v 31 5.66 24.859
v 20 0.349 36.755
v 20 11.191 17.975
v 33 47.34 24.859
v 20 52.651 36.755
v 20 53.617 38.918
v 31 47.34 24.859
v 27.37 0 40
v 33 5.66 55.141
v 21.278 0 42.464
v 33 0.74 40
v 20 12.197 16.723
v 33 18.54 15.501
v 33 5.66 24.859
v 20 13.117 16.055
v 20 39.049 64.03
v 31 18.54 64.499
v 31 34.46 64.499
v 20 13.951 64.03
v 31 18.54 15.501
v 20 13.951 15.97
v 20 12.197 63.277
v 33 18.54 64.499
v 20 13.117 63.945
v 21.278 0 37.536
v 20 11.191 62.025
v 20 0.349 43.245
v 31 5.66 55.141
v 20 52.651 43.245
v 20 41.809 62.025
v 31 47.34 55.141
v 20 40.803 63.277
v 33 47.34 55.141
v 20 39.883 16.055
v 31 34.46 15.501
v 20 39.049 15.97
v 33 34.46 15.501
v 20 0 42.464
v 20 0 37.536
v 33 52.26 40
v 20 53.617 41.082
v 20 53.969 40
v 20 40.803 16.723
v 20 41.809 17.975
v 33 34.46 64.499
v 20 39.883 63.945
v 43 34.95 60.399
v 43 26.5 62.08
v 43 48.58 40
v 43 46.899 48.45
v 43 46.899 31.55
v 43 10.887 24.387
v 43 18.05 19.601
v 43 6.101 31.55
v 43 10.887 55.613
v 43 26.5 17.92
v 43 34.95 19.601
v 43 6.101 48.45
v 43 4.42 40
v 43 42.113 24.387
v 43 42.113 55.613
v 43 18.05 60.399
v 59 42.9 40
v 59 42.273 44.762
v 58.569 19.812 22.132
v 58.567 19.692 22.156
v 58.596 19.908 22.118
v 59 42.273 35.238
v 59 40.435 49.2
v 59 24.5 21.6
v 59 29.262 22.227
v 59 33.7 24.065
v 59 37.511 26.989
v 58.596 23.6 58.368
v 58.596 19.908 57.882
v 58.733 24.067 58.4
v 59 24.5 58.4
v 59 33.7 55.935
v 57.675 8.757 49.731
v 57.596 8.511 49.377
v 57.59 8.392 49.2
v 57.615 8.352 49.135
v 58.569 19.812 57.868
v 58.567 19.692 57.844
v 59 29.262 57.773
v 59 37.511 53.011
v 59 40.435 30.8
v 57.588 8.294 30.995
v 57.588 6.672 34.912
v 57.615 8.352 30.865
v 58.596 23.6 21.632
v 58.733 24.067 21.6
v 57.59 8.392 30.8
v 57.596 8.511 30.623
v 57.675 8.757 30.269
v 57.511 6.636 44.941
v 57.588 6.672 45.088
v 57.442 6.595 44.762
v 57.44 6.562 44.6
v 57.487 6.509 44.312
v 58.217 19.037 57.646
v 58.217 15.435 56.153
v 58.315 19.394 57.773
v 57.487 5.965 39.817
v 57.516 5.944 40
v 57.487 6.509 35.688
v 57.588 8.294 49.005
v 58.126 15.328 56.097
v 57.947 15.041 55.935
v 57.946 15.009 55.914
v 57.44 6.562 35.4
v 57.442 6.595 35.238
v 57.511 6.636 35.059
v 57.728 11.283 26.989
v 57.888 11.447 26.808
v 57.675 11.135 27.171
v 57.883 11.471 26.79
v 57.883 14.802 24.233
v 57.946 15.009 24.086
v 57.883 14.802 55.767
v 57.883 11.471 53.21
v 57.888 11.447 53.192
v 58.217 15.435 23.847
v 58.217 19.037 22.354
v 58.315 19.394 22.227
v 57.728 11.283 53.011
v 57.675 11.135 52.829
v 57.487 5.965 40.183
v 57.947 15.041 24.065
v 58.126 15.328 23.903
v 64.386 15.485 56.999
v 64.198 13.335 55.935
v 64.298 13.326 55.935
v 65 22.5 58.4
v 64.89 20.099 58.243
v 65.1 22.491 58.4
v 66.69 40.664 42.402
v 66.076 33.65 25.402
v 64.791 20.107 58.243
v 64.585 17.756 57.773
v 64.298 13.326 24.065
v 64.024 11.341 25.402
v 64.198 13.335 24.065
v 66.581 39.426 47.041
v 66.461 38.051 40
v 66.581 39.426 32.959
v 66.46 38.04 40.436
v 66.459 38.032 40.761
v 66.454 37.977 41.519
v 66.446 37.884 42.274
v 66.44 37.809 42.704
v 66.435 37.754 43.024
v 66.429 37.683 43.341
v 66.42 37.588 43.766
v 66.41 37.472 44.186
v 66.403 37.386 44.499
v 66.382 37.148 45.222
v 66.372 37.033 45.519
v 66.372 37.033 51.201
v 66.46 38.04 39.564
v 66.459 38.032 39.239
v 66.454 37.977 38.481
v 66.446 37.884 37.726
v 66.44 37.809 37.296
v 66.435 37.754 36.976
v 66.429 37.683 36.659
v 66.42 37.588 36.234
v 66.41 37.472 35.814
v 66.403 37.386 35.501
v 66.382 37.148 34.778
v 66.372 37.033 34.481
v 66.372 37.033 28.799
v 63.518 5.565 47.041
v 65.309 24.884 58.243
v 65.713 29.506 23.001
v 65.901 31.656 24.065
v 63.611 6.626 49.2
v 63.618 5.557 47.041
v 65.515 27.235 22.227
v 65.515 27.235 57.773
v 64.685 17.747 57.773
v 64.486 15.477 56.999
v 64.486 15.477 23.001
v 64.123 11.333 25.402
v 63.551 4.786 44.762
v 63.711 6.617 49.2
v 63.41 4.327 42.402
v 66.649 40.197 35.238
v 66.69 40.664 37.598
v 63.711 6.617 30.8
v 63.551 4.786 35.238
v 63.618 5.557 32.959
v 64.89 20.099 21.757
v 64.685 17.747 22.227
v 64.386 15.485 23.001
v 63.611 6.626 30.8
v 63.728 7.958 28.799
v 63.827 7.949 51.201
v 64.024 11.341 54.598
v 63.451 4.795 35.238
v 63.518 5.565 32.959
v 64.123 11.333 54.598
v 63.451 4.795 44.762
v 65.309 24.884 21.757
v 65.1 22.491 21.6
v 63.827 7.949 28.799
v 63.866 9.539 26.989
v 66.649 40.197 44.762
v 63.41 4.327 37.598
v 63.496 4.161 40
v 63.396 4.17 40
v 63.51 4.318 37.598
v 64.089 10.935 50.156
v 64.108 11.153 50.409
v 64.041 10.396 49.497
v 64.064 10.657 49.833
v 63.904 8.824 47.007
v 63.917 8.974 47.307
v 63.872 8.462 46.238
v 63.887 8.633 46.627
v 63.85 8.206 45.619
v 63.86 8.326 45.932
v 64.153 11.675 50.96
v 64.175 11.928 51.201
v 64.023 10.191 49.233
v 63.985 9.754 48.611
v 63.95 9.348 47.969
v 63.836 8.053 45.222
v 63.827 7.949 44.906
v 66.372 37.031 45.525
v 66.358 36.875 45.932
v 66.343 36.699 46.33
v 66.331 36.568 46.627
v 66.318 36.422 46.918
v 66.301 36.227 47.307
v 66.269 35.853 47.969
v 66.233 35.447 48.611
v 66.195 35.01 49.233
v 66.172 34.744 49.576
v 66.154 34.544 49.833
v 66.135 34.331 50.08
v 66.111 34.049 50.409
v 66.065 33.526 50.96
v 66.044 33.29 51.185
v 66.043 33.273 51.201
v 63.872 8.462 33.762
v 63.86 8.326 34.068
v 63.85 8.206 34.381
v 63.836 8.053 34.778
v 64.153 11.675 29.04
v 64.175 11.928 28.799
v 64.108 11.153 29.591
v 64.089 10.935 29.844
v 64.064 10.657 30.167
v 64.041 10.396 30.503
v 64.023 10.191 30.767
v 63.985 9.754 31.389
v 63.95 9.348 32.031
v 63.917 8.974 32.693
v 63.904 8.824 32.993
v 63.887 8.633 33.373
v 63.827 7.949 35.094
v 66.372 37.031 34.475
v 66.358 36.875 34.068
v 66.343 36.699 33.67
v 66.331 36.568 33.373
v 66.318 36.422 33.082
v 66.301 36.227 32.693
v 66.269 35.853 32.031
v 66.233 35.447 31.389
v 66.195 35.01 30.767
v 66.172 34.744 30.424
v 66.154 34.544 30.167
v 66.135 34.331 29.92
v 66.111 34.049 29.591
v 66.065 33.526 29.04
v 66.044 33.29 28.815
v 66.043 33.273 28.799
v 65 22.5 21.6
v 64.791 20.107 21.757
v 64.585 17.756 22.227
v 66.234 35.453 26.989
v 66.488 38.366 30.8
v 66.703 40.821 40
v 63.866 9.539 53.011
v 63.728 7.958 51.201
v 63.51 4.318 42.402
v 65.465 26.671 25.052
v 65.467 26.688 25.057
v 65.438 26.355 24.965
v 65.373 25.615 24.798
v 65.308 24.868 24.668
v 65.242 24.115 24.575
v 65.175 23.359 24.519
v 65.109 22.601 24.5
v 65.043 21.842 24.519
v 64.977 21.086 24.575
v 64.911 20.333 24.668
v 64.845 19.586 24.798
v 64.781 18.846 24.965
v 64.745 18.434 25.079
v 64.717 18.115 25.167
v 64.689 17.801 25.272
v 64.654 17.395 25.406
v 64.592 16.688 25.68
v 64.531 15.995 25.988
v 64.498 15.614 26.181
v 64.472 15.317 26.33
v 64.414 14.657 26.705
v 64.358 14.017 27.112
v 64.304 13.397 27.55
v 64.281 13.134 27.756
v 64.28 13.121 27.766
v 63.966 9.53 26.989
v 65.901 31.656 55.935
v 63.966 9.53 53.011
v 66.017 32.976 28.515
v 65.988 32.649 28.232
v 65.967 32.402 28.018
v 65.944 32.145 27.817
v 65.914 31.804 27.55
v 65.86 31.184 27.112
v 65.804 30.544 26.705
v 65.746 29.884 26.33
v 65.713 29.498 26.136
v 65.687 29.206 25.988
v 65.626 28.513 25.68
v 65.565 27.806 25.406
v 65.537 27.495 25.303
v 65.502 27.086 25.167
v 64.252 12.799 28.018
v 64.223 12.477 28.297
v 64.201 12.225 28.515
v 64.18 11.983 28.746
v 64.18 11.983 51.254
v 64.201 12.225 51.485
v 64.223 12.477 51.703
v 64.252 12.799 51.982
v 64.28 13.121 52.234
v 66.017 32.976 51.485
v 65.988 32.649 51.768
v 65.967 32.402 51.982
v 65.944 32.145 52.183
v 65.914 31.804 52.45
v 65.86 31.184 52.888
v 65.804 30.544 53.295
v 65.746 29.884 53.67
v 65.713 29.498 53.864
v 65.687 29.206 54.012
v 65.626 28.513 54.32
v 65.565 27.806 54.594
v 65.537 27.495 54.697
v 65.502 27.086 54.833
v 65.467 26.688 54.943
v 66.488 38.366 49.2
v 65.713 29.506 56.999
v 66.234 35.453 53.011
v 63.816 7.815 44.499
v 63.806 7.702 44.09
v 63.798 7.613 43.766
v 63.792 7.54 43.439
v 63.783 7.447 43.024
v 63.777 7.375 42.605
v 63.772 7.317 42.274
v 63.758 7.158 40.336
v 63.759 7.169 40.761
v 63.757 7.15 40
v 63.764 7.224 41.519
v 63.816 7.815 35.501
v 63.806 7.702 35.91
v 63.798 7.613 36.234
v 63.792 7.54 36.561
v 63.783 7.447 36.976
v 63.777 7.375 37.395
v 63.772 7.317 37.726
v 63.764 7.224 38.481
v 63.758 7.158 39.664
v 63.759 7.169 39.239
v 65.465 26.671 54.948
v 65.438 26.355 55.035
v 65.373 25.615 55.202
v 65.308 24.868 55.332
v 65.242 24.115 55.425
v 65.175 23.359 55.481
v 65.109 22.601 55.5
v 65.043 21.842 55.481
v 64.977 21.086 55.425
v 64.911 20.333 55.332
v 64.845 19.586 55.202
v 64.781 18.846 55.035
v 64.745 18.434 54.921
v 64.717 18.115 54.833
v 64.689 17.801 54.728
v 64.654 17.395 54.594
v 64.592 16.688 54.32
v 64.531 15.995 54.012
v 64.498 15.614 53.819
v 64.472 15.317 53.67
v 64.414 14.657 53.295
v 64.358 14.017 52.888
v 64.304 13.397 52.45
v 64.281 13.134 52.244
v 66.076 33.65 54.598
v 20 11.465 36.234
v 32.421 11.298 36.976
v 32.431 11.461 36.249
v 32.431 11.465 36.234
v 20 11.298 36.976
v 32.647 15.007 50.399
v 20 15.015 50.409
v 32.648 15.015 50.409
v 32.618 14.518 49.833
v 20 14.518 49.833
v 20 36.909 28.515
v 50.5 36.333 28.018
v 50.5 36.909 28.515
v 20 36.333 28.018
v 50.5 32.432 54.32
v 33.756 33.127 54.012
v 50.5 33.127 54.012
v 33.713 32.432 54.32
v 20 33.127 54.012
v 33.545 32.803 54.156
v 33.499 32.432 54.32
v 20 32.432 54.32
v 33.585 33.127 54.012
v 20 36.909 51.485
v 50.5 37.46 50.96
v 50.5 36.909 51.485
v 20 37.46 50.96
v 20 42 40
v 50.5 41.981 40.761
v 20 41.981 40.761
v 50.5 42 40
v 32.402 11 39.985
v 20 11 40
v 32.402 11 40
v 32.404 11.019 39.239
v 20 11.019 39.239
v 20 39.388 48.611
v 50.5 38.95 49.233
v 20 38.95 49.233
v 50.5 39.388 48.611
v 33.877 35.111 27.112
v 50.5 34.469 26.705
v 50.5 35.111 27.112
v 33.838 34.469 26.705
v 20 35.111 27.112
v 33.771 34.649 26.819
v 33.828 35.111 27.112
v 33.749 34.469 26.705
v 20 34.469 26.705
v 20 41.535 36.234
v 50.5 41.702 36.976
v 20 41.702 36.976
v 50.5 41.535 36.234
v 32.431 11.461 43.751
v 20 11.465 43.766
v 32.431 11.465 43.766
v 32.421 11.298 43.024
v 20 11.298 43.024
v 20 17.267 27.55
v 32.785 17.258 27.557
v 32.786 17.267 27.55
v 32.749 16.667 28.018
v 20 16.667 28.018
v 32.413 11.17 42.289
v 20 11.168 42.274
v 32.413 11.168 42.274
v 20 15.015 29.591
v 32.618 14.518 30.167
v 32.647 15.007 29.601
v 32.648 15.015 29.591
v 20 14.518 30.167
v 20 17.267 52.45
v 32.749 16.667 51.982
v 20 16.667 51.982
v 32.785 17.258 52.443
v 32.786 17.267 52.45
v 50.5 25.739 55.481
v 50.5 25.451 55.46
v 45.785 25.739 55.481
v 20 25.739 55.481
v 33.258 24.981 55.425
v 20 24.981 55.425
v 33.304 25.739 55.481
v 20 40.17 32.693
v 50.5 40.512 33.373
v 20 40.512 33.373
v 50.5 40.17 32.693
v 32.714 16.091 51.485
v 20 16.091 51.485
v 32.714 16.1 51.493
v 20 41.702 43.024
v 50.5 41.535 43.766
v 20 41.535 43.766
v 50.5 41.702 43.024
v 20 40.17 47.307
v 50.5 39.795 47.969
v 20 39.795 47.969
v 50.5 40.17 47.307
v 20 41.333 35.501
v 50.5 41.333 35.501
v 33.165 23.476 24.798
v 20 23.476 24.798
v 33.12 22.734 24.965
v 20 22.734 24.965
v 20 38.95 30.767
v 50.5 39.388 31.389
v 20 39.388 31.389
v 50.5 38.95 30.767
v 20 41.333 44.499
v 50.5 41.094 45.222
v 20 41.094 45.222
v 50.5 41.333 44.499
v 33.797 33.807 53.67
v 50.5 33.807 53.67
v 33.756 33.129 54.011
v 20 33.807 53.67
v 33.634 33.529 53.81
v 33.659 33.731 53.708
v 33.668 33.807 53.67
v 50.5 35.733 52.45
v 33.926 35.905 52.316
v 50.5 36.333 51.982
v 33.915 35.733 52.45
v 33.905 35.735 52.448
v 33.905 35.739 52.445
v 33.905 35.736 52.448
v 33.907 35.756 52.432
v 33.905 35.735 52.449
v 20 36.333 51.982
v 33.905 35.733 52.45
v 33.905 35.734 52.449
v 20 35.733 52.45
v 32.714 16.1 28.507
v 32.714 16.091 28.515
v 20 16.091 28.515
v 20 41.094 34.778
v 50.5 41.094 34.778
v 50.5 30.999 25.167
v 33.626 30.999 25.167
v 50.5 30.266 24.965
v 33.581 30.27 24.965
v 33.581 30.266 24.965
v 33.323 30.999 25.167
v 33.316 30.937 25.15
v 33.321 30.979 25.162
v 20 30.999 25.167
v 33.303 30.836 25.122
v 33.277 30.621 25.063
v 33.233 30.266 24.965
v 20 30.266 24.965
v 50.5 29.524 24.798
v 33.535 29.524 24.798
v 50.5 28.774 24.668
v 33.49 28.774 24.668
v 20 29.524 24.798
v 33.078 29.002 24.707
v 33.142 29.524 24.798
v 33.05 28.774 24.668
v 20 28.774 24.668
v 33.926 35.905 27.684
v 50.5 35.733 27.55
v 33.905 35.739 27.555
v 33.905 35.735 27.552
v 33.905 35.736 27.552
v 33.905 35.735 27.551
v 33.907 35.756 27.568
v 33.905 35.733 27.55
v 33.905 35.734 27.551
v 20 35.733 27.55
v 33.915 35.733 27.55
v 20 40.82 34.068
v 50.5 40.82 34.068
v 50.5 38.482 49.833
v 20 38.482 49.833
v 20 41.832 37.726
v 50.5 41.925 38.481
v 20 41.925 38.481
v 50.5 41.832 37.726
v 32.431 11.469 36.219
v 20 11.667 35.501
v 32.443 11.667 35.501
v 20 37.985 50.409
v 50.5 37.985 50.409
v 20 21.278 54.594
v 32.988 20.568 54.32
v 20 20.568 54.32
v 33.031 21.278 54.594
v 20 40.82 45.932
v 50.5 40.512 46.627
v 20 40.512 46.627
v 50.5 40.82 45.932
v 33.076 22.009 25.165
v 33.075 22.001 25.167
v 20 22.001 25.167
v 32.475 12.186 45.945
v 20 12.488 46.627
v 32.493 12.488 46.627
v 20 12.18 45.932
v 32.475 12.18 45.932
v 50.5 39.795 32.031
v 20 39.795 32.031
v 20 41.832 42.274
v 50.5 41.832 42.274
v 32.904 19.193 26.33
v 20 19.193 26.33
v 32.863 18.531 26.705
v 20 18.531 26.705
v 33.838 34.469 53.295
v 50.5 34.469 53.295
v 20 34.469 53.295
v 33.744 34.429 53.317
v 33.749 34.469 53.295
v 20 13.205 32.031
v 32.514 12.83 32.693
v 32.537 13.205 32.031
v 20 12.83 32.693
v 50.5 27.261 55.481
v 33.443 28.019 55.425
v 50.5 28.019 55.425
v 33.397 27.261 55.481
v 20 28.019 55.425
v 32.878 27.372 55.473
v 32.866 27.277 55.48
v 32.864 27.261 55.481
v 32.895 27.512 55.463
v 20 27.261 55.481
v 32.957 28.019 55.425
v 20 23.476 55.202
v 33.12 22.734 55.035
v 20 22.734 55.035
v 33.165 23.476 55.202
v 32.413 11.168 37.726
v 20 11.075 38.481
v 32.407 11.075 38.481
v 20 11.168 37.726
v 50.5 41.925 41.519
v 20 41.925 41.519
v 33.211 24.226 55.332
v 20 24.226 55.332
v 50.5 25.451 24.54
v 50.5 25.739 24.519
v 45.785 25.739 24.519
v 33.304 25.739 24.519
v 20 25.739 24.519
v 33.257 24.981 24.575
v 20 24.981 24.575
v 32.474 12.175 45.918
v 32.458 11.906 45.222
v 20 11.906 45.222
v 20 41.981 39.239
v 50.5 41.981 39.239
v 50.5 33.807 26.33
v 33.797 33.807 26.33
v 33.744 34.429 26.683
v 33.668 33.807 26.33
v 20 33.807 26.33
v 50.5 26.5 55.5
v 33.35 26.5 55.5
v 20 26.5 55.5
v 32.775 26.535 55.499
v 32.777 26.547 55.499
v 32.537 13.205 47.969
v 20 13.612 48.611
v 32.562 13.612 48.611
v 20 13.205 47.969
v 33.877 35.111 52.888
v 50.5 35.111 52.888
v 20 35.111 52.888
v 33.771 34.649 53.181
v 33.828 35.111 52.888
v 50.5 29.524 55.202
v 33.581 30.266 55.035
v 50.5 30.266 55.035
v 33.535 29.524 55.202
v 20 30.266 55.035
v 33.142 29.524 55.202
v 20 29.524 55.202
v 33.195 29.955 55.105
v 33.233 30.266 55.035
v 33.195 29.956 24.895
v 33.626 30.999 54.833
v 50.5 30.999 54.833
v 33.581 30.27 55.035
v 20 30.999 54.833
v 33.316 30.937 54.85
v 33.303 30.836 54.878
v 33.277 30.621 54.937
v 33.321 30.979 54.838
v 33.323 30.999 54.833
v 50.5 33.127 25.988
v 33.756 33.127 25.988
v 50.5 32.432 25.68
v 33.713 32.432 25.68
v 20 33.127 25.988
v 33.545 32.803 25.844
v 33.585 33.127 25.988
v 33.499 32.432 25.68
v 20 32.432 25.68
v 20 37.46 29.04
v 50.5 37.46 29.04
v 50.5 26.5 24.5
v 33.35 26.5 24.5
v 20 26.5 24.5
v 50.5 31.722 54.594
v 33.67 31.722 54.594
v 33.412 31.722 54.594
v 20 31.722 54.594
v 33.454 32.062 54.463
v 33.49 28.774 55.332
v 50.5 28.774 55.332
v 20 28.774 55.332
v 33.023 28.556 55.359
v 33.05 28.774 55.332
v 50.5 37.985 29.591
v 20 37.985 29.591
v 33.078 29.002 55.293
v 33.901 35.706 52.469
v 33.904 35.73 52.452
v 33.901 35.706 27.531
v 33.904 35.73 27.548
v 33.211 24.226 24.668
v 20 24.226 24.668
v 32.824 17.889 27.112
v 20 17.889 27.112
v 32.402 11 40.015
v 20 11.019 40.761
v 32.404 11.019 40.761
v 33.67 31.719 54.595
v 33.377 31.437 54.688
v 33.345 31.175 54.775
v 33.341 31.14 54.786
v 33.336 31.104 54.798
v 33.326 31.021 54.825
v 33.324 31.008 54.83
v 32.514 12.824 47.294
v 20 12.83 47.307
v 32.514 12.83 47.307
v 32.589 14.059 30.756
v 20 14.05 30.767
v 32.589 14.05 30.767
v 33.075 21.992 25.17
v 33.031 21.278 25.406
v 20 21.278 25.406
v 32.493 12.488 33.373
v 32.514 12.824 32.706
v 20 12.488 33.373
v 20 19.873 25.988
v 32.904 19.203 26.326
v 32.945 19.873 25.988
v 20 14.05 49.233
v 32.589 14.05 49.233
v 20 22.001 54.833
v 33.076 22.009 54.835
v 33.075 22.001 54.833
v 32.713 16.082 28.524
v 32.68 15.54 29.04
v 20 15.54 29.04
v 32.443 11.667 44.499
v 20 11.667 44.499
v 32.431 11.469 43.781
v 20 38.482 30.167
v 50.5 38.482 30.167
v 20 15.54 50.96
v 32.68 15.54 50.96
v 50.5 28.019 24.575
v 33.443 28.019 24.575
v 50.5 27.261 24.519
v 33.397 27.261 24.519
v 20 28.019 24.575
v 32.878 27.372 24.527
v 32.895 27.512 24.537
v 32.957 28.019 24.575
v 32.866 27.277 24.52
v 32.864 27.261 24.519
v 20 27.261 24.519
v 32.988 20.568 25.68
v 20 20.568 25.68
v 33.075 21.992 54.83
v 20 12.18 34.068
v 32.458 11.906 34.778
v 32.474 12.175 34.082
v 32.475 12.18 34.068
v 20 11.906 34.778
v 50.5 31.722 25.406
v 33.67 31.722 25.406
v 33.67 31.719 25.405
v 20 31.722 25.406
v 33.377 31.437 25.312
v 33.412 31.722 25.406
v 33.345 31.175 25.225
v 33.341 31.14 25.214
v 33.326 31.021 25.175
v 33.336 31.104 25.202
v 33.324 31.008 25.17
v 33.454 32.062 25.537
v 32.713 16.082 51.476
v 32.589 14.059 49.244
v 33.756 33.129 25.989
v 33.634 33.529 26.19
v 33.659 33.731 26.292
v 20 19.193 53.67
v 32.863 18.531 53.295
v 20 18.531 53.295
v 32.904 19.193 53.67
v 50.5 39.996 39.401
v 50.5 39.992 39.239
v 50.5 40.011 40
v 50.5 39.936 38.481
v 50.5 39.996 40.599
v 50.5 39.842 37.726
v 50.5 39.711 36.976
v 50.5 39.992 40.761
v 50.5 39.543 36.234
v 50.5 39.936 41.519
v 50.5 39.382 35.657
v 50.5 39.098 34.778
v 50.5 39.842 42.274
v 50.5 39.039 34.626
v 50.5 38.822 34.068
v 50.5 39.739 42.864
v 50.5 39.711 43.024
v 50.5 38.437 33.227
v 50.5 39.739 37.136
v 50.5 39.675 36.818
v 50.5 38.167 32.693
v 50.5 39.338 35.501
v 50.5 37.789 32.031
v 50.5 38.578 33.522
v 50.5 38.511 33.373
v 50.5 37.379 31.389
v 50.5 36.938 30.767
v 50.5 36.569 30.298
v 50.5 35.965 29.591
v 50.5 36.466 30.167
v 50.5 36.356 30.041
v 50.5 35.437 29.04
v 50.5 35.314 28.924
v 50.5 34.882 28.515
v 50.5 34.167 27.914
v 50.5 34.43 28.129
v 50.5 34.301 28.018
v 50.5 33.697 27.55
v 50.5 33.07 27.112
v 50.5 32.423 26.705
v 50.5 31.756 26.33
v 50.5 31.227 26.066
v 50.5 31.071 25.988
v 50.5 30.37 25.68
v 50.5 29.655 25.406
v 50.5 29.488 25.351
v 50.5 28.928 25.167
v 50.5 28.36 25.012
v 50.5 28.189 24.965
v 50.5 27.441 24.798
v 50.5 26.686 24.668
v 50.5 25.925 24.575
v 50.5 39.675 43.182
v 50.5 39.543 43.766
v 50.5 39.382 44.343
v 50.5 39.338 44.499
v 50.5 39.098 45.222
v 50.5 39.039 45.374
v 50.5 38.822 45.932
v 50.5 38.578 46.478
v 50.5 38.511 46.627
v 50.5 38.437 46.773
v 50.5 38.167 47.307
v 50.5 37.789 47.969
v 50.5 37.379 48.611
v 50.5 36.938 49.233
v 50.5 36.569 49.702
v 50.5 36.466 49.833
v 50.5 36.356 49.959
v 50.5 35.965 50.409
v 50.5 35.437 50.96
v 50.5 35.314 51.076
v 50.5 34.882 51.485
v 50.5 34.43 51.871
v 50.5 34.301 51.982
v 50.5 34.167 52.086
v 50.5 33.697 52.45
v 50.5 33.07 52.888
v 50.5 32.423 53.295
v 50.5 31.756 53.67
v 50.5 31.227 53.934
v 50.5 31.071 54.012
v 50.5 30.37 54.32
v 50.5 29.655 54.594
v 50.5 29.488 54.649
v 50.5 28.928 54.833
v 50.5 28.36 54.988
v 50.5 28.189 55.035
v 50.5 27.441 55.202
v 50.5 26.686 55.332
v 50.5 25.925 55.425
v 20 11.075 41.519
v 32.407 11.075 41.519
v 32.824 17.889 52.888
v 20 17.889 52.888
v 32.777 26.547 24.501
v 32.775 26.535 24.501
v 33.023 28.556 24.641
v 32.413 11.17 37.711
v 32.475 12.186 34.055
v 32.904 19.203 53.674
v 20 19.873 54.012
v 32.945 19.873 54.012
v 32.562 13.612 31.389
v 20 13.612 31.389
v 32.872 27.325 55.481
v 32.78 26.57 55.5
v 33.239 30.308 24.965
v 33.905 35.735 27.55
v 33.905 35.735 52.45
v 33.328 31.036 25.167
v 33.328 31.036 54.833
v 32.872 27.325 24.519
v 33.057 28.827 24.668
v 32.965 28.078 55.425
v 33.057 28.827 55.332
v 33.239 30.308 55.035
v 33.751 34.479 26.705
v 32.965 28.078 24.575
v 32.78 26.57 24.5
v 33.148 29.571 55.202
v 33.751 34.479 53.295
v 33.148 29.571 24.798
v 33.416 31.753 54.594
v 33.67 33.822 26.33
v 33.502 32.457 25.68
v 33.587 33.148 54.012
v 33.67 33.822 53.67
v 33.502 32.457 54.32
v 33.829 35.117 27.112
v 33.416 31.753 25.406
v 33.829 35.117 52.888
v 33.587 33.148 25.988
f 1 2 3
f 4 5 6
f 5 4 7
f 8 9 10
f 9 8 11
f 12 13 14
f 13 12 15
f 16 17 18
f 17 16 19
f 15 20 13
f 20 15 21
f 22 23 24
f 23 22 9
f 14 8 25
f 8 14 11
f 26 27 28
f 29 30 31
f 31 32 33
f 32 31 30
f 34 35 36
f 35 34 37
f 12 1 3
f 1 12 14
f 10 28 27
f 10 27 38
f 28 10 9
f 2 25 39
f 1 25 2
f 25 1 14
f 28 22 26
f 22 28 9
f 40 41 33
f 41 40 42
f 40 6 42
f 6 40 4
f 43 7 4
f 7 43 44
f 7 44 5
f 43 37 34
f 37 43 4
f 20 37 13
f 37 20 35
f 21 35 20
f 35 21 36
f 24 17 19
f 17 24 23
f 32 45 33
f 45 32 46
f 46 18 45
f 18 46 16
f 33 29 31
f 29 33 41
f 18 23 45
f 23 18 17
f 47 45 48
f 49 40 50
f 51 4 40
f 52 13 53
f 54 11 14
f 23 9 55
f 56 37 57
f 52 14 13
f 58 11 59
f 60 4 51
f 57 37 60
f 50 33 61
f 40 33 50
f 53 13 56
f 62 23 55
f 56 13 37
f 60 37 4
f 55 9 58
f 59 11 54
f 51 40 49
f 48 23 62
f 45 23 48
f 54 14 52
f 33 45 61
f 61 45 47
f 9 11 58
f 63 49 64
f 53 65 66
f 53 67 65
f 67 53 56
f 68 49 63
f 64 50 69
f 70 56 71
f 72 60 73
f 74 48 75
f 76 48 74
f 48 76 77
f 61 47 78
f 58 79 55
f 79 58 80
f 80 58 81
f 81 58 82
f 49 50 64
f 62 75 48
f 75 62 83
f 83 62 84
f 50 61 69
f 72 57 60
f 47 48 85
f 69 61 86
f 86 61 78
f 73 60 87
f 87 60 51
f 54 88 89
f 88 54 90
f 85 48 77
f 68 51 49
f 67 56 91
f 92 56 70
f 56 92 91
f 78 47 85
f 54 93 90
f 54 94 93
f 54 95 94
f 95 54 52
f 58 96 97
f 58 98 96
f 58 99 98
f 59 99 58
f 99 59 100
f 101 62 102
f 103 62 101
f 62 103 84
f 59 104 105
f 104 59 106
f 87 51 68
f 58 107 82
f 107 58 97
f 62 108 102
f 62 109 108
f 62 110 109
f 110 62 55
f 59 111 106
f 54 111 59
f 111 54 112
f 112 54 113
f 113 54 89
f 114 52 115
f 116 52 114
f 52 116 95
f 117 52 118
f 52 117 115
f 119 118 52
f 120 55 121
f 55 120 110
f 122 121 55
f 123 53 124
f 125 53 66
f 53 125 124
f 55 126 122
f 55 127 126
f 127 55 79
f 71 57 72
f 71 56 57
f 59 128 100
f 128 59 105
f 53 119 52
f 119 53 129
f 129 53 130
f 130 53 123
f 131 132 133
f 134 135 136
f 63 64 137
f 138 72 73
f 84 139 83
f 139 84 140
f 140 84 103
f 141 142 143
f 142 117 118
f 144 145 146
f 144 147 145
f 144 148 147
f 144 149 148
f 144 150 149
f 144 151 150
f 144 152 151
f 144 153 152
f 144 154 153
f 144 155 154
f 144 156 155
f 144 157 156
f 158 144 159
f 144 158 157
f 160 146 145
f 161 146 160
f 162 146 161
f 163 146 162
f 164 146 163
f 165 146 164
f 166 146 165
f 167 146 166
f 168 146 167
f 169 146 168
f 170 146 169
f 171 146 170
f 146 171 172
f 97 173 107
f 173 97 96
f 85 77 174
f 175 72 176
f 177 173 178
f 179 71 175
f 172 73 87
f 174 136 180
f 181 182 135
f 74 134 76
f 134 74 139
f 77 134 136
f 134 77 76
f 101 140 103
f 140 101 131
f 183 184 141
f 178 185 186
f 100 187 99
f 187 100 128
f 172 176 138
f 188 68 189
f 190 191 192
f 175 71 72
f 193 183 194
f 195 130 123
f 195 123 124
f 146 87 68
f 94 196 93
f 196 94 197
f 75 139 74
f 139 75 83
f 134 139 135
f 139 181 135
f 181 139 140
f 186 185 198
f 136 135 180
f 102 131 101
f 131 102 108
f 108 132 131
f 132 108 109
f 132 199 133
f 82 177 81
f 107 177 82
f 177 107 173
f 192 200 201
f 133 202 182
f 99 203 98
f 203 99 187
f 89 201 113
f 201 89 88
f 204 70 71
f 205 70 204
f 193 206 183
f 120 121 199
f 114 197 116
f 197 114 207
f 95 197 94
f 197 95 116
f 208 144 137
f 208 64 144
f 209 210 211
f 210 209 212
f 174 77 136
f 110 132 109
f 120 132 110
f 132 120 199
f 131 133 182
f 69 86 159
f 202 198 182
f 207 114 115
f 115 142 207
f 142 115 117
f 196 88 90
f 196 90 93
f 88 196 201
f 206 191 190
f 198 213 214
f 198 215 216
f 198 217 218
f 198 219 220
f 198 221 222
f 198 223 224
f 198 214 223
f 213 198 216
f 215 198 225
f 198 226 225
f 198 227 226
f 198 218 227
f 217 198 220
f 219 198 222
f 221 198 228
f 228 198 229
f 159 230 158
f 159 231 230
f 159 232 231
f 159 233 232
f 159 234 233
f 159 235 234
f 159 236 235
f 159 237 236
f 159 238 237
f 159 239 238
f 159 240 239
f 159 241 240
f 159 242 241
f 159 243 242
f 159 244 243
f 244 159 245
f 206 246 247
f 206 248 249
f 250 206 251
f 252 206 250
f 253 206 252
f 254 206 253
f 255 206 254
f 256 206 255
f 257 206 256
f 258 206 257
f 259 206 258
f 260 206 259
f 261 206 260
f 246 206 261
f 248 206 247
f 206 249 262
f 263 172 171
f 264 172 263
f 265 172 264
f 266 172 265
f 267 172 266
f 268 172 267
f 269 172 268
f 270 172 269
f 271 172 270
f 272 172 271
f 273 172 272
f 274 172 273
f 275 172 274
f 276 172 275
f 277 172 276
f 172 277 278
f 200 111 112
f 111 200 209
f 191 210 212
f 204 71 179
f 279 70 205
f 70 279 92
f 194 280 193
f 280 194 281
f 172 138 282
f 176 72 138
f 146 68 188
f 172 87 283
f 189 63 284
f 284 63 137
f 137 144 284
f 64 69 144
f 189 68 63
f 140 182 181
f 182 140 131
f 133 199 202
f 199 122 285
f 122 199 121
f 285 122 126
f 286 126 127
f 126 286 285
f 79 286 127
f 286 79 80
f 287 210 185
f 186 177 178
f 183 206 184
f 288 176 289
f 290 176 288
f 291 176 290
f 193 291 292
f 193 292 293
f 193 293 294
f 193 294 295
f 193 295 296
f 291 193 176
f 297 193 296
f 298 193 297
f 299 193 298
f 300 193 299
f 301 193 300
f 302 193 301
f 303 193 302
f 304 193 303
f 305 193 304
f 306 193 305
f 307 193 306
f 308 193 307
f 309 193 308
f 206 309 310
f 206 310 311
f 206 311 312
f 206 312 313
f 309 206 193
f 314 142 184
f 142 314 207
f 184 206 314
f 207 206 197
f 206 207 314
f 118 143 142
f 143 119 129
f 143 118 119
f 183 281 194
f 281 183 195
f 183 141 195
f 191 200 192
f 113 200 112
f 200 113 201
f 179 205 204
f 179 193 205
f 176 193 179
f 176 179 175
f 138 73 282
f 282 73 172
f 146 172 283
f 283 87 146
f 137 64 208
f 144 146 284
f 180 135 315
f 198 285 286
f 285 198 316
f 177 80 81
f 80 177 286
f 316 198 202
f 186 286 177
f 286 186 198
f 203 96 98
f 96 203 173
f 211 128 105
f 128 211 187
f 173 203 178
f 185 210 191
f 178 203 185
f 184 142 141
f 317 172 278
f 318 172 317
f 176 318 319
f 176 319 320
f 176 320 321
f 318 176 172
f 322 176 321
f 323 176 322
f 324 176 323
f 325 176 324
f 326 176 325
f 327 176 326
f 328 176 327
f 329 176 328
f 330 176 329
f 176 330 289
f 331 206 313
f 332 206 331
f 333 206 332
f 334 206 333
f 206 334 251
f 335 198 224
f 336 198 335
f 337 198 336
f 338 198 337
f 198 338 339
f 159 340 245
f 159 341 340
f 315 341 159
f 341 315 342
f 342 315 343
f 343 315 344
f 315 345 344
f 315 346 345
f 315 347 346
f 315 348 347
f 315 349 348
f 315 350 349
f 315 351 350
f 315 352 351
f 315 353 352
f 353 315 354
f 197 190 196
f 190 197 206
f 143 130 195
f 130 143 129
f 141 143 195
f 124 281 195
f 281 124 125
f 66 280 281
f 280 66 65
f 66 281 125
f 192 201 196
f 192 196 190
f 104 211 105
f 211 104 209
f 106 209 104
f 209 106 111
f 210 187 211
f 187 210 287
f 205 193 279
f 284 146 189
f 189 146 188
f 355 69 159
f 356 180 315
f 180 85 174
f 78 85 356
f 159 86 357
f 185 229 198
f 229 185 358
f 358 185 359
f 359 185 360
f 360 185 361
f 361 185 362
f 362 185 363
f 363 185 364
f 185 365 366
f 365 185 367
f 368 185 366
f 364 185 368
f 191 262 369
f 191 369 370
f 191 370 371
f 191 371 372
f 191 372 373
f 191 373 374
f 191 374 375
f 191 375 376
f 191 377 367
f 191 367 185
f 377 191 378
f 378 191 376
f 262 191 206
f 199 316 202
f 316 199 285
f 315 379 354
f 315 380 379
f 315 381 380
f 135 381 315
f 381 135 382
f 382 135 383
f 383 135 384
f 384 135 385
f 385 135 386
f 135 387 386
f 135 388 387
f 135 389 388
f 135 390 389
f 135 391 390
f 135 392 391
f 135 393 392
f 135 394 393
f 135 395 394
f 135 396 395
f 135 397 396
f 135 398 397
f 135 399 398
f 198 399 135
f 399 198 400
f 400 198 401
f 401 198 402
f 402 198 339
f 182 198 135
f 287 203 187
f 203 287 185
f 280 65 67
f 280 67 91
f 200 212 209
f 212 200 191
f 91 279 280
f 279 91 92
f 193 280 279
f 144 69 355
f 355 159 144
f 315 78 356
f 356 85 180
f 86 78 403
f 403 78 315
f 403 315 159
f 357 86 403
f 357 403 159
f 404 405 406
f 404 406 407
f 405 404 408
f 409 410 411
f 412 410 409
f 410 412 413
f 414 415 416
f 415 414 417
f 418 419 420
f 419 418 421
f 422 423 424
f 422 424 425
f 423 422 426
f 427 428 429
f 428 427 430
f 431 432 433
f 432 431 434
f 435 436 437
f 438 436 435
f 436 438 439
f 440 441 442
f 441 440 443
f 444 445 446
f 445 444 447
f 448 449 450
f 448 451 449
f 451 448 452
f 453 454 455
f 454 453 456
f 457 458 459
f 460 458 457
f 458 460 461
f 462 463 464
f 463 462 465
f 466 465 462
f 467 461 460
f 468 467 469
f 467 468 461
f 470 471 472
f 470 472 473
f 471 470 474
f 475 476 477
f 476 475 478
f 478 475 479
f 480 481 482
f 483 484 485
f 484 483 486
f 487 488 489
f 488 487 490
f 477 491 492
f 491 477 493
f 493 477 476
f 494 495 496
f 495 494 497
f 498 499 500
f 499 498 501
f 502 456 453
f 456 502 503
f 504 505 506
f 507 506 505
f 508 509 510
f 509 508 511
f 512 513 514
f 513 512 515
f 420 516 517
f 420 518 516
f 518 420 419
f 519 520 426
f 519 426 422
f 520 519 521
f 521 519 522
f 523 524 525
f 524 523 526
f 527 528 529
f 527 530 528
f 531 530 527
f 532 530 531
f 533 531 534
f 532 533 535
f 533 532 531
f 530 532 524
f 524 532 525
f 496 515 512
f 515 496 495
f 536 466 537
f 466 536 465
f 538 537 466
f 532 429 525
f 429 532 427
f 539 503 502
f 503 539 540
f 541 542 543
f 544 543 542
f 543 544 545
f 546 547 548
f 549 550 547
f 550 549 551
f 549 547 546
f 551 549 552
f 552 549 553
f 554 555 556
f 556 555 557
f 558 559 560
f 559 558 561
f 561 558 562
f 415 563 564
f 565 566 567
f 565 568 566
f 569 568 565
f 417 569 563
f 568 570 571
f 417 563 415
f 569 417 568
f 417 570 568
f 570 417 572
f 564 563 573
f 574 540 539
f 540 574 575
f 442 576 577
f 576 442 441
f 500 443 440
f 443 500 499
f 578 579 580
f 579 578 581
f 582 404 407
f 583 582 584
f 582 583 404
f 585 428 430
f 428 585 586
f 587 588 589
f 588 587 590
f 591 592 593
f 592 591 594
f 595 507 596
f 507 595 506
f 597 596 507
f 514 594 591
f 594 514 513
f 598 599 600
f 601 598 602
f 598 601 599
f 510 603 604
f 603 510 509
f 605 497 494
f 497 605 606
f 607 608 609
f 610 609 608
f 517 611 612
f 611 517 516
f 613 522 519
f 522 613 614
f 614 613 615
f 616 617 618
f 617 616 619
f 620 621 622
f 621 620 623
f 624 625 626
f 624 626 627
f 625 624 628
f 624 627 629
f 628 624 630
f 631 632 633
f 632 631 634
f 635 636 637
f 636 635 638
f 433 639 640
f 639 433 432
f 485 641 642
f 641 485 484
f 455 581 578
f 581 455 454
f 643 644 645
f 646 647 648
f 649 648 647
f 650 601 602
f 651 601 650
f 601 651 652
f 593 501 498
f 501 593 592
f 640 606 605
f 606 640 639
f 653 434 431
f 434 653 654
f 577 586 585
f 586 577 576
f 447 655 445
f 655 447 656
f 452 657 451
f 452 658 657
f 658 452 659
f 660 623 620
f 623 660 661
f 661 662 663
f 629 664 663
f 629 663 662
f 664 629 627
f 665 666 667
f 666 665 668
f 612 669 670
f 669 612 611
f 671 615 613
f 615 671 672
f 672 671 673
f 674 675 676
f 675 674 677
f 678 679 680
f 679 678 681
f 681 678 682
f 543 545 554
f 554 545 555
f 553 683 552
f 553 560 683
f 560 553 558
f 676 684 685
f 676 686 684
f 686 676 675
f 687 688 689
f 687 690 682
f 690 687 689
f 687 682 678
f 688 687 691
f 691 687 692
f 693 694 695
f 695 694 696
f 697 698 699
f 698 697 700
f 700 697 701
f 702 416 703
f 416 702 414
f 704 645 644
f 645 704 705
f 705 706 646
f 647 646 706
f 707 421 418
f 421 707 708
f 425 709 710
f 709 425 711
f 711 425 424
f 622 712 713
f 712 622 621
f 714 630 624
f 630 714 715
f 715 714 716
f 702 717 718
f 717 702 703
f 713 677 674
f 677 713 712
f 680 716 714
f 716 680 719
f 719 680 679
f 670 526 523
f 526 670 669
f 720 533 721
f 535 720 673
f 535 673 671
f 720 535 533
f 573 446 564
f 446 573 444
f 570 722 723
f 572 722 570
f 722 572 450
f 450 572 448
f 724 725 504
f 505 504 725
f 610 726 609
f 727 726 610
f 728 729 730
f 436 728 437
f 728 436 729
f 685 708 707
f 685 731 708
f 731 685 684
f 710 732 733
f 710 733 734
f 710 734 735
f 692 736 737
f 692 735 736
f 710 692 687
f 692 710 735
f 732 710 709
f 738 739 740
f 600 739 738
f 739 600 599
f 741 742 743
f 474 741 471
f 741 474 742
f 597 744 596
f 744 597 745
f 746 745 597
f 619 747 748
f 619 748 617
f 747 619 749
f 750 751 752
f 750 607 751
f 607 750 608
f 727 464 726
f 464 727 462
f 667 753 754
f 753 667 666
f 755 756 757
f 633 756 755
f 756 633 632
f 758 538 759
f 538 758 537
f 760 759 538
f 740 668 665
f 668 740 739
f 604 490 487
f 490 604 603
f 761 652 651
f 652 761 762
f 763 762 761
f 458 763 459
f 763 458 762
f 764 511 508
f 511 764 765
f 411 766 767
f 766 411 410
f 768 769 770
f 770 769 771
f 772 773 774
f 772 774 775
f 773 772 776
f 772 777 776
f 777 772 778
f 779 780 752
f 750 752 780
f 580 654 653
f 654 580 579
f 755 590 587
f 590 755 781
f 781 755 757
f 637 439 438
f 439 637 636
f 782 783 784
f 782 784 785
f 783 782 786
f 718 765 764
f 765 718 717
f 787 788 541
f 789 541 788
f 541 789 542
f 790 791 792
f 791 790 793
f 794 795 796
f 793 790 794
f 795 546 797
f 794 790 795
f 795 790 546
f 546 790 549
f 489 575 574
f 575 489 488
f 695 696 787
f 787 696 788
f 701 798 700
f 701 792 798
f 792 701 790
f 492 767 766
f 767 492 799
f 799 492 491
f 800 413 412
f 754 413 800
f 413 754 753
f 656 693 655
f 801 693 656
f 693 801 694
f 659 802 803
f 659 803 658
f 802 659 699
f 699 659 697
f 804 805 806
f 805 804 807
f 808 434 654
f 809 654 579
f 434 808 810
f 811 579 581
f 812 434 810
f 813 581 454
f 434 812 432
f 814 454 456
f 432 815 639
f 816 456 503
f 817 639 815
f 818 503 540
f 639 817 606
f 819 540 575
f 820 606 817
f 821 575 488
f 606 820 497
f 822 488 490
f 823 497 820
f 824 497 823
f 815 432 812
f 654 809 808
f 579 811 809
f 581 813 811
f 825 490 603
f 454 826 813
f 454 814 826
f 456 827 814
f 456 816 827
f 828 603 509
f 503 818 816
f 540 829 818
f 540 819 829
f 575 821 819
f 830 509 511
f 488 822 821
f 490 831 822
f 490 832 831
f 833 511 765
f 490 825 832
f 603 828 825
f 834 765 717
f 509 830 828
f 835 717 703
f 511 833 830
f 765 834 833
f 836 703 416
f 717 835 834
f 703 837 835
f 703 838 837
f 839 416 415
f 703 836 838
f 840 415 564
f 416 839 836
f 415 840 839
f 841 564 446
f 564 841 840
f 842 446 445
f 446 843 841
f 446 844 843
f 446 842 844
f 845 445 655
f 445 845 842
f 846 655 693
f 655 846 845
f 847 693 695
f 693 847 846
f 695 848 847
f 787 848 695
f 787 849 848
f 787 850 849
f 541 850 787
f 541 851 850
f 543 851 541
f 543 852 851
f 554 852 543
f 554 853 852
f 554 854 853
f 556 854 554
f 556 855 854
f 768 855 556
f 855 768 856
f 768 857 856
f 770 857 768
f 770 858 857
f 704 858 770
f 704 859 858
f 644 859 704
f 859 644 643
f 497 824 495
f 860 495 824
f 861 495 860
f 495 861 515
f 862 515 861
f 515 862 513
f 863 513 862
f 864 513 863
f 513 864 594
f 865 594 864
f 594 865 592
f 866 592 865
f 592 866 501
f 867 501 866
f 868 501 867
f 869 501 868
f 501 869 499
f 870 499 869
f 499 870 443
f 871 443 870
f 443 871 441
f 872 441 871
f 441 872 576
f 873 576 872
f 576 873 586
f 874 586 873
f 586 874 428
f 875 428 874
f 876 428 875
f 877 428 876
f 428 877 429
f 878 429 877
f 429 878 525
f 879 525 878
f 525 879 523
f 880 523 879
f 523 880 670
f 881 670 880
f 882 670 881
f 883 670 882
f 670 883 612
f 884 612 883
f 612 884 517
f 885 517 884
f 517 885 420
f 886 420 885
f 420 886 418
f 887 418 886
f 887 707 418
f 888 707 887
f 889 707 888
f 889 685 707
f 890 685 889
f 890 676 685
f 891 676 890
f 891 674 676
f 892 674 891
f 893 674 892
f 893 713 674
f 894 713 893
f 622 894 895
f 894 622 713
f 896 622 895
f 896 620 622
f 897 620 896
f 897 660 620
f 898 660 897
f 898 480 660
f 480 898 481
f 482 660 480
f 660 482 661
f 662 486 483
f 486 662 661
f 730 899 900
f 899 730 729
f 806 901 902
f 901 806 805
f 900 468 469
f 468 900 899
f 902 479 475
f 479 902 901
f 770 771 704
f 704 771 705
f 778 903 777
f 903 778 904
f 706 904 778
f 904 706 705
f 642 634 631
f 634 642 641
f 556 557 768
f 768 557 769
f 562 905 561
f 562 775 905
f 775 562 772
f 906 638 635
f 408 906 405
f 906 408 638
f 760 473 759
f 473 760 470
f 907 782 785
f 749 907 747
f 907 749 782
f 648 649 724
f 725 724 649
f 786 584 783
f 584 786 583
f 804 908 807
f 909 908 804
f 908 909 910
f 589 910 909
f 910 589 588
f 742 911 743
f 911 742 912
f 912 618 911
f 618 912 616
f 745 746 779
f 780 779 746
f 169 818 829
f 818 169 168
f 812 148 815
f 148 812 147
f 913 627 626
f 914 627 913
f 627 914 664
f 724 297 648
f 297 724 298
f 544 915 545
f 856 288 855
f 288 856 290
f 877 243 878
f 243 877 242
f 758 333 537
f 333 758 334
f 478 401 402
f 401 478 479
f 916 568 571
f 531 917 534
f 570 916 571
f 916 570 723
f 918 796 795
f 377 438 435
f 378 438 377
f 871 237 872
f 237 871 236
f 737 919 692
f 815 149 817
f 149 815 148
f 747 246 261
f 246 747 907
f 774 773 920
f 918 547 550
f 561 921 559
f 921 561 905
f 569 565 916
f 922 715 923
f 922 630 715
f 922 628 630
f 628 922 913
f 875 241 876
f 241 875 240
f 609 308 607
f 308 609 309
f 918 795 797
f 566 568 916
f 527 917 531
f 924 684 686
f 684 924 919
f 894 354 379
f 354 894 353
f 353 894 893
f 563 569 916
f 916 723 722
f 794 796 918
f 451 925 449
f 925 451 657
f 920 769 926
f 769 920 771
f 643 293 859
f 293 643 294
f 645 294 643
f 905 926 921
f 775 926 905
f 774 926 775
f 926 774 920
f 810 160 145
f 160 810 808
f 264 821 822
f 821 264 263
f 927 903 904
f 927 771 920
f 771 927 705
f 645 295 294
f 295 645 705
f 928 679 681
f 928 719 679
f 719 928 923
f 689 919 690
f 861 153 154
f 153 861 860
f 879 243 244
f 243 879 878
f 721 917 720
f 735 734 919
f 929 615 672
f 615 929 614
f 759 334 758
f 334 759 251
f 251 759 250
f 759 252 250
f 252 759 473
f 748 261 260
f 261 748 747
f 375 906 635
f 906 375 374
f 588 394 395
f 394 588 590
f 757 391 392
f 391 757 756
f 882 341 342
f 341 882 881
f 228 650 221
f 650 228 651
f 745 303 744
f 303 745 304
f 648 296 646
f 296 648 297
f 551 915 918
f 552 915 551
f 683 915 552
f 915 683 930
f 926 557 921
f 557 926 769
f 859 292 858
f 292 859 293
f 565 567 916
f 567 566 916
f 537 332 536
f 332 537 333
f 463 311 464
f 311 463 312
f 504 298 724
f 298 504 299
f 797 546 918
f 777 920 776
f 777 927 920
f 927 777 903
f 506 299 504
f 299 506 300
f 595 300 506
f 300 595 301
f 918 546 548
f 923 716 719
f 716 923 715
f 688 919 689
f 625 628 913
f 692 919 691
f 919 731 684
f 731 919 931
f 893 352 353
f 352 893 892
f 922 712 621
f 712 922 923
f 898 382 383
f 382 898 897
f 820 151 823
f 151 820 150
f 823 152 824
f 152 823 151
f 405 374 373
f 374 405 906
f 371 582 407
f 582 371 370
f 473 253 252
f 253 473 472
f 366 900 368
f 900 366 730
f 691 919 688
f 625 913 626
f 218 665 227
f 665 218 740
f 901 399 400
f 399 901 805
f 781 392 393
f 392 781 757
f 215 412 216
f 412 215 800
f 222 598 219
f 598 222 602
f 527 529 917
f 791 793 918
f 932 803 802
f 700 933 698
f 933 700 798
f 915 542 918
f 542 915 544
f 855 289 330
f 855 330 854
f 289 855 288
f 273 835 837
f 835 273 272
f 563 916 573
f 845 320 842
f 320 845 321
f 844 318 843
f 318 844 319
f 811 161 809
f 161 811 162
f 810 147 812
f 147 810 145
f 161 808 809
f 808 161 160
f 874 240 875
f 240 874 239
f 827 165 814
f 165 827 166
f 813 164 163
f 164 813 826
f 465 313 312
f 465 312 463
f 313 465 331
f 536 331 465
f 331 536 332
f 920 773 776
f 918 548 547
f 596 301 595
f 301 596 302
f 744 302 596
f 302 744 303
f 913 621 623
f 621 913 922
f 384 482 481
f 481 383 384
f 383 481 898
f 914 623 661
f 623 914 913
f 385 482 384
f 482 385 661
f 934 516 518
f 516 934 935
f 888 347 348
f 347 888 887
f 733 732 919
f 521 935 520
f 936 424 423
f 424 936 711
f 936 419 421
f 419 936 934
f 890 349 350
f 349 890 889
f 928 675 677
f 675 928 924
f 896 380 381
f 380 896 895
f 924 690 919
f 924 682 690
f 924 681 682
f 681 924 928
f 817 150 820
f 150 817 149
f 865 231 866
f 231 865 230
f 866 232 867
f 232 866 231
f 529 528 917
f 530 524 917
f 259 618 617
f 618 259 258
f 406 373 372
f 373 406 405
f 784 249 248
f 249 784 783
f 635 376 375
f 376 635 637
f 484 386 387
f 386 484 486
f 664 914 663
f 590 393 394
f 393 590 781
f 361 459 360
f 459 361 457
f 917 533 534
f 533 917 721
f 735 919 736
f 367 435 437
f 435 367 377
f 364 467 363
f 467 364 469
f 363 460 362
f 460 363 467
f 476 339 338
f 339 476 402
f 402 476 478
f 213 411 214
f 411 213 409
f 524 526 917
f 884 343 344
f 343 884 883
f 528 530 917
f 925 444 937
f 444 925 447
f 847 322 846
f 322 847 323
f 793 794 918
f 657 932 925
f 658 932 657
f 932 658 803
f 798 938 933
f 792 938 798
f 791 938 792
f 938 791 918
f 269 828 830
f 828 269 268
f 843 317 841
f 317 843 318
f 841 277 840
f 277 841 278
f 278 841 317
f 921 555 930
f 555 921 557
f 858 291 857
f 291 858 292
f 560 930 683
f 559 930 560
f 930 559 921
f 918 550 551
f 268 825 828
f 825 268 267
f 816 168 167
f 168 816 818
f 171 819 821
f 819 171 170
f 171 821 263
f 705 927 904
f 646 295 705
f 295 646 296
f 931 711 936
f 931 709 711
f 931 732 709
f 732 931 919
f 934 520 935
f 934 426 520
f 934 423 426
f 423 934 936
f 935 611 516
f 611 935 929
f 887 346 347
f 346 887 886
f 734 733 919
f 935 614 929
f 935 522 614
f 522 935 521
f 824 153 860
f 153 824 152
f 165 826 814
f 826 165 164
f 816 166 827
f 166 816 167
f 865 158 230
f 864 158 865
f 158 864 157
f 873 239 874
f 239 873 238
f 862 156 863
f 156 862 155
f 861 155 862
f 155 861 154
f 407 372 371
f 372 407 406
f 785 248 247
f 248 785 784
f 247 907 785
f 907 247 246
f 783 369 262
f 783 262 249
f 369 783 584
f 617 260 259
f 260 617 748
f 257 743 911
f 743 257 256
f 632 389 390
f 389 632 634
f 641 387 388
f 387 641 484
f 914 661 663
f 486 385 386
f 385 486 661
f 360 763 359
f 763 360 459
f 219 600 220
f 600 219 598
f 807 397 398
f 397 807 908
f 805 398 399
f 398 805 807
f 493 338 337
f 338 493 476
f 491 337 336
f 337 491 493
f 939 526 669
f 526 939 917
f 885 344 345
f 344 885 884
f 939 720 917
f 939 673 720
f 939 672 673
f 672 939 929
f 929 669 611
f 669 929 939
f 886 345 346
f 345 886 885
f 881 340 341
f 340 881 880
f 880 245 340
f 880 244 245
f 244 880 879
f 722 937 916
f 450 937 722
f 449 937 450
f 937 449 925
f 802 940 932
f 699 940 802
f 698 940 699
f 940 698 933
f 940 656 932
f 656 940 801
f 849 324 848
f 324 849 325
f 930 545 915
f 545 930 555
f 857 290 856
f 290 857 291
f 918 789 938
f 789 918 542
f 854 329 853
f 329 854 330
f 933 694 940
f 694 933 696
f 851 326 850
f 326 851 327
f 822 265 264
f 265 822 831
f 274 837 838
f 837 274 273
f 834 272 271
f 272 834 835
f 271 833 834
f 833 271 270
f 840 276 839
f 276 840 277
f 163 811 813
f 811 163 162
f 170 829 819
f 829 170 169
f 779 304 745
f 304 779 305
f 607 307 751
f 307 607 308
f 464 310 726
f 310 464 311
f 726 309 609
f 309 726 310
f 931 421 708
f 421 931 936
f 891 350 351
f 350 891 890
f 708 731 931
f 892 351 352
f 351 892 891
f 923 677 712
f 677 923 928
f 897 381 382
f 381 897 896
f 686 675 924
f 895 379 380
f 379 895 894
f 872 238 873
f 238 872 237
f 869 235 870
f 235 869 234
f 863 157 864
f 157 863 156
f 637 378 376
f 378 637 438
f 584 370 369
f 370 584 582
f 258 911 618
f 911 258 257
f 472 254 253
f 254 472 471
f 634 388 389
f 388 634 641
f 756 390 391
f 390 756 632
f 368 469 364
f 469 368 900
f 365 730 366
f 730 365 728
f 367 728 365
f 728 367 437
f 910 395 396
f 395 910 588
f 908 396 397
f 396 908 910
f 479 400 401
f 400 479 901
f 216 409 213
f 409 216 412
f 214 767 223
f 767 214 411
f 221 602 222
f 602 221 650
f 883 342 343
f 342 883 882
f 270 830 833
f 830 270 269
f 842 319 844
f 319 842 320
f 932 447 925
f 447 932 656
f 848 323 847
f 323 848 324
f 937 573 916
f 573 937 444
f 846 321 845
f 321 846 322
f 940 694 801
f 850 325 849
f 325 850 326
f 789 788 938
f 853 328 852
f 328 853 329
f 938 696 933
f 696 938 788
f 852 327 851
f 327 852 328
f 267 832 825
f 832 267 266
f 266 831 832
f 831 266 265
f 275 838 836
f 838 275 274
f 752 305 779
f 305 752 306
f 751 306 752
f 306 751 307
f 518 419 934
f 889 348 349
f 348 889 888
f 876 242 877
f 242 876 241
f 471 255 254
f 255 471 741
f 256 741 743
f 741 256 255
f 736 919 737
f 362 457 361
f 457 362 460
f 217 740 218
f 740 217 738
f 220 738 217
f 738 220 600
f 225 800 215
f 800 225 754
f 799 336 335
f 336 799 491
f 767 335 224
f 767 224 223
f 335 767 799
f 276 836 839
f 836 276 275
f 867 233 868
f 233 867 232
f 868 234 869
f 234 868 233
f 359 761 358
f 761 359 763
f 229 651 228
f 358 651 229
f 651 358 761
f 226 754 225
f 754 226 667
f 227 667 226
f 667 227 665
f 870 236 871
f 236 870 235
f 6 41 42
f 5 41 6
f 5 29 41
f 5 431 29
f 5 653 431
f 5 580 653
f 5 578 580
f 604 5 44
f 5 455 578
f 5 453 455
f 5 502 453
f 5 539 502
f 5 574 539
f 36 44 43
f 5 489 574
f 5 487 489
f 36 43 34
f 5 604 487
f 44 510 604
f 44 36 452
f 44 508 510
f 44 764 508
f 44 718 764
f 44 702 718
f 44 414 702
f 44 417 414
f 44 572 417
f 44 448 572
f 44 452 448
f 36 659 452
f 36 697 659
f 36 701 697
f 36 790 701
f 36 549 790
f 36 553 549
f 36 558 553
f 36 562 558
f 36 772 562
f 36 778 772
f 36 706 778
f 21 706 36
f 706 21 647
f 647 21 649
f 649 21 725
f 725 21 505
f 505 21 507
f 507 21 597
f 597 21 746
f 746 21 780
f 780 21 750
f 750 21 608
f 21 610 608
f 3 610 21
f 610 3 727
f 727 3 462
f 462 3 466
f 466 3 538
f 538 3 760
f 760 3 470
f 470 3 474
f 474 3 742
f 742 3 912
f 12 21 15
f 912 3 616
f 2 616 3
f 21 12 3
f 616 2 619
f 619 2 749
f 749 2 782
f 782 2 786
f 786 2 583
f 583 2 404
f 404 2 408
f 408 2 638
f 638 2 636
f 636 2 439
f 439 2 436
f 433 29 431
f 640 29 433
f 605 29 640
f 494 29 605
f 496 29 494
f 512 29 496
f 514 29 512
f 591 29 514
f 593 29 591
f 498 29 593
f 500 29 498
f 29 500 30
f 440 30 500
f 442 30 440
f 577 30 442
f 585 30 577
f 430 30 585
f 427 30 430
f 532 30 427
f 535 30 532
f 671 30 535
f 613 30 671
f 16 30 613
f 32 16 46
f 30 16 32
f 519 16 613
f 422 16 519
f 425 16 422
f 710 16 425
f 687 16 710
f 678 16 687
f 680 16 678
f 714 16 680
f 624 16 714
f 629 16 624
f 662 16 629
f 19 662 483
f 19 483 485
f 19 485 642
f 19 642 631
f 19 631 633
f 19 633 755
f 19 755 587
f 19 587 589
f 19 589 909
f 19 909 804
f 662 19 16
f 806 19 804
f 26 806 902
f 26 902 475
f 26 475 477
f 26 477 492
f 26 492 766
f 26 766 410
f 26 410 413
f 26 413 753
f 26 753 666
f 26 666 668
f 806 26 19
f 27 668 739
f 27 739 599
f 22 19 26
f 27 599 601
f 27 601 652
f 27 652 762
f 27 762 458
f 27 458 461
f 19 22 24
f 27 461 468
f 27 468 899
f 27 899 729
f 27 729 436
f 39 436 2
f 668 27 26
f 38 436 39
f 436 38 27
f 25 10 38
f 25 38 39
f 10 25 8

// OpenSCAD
WIDTH = 131;
DIAMETER = 31; // 1.25"
DPAD = 5.8;
BOTTOM_X = -35;
Y_MAX = 53;

X_STOPS = [8, 14, 10, 16, 8];
X_MULTS = [1.5, 1.4, 1.2, 1, 1];

outerDiameter = DIAMETER + DPAD;
outerRadius = outerDiameter / 2;
holeY = 27;
holeZ = 40;
triangleY = (20 * sqrt(3) / 2);
  increase = 0.4;

*difference() {
linear_extrude(height = 10, convexity = 3) {
      polygon([
        [0, 0],
        [10, 0],
        [10, 53],
        [0, 57],
        [-17, 59],
        [BOTTOM_X, 60],
        [BOTTOM_X, 50],
        [0, 35],
        [-10, 23],
        [BOTTOM_X, 19],
        [BOTTOM_X, 15],
        [-17, 14]
      ]);
    }
    
    translate([-70, 0, 0]) cube([50, 80, 80]);
    
  }

intersection() {
difference() {
  union() {
    linear_extrude(height = WIDTH, convexity = 3) {
      polygon([
        [0, 0],
        [10, 0],
        [10, 53],
        [0, 57],
        [-17, 59],
        [BOTTOM_X, 60],
        [BOTTOM_X, 50],
        [0, 35],
        [-10, 23],
        [BOTTOM_X, 19],
        [BOTTOM_X, 15],
        [-17, 14]
      ]);
    }

    translate([-2, 0, 0]) {
      translate([11, -0.5 + holeY, holeZ])
        hull() {
          translate([0, 0, 25.5]) cube([2, Y_MAX, WIDTH], center = true);
          
          translate([X_STOPS[0], 0, 0])
            rotate([30, 0, 0]) 
              rotate([0, 90, 0])
                cylinder(2, d = outerDiameter * X_MULTS[0], , $fn = 6);
        }
        
      translate([11, -0.5 + holeY, holeZ])
        hull()
          translate([X_STOPS[0], 0, 0]) {
            rotate([30, 0, 0]) 
              rotate([0, 90, 0])
                cylinder(2, d = outerDiameter * X_MULTS[0], , $fn = 6);
            
            translate([X_STOPS[1], 0, 0])
              rotate([18, 0, 0]) 
                rotate([0, 90, 0])
                  cylinder(2, d = outerDiameter * X_MULTS[1], , $fn = 10);
          }
      
      translate([11, -0.5 + holeY, holeZ]) translate([X_STOPS[0], 0, 0])
        hull()
          translate([X_STOPS[1], 0, 0]) {
              rotate([18, 0, 0]) 
                rotate([0, 90, 0])
                  cylinder(2, d = outerDiameter * X_MULTS[1], , $fn = 10);
            
            translate([X_STOPS[2], 0, 0]) {
              rotate([45, 0, 0]) rotate([0, 90, 0]) 
                cylinder(2, d = outerDiameter * X_MULTS[2], $fn = 16);
            }
          }

      translate([11, -0.5 + holeY, holeZ]) 
        translate([X_STOPS[0], 0, 0]) 
          translate([X_STOPS[1], 0, 0])
            hull()  
              translate([X_STOPS[2], 0, 0]) {
                rotate([45, 0, 0]) rotate([0, 90, 0])               
                  cylinder(2, d = outerDiameter * X_MULTS[2], $fn = 16);
                
              translate([X_STOPS[3], -2, 0])
                rotate([0, 90, 0]) cylinder(2, d = outerDiameter * X_MULTS[3], $fn = 24);
          }
          
      translate([11, -0.5 + holeY, holeZ]) 
        translate([X_STOPS[0], 0, 0]) 
          translate([X_STOPS[1], 0, 0])
            translate([X_STOPS[2], 0, 0])
            hull()  
              translate([X_STOPS[3], -2, 0]) {
                rotate([45, 0, 0]) rotate([0, 90, 0])               
                  cylinder(2, d = outerDiameter * X_MULTS[3], $fn = 24);
                
              translate([X_STOPS[4], -2, 0])
                rotate([0, 90, -5]) cylinder(0.1, d = outerDiameter * X_MULTS[4], $fn = 48);
          }
    }
  }

  translate([70, -0.5 + holeY - 4.5, holeZ]) 
    rotate([0, 90, -7])
      cylinder(75, d = DIAMETER, center = true, $fn = 128);

  translate([-35, 20, holeZ]) 
    rotate([90, 0, 0])
      scale([1, 1.33, 1])
        cylinder(40, d = 60, $fn = 3, center = true);
  
  translate([0, holeY - 0.5, holeZ]) 
    rotate([0,270,0]) translate([0,0,-50]) {
      $fn = 128;
      
      hull() {
        cylinder(h = 1, d = DIAMETER, center = true);
        translate([0, 0, 32]) cylinder(h = 0.1, d = DIAMETER, center = true);
      }
      
      hull() {
        translate([0, 0, 32]) cylinder(h = 0.1, d = DIAMETER, center = true);
        translate([0, DIAMETER * (increase - 0.1), 60]) 
          scale([1.5, 1]) 
            cylinder(h = 0.1, d = DIAMETER * (1 + increase), center = true);
      }
      
      hull() {
        translate([0, DIAMETER * (increase - 0.1), 60]) 
          scale([1.5, 1]) 
            cylinder(h = 0.1, d = DIAMETER * (1 + increase), center = true);
        
        translate([0, DIAMETER * (increase - 0.1), 100]) 
          scale([1.5, 1])
            cylinder(h = 0.1, d = DIAMETER * (1 + increase), center = true);
      }
    }
  }
  
  translate([20, 0, 10]) cube(60);
}
